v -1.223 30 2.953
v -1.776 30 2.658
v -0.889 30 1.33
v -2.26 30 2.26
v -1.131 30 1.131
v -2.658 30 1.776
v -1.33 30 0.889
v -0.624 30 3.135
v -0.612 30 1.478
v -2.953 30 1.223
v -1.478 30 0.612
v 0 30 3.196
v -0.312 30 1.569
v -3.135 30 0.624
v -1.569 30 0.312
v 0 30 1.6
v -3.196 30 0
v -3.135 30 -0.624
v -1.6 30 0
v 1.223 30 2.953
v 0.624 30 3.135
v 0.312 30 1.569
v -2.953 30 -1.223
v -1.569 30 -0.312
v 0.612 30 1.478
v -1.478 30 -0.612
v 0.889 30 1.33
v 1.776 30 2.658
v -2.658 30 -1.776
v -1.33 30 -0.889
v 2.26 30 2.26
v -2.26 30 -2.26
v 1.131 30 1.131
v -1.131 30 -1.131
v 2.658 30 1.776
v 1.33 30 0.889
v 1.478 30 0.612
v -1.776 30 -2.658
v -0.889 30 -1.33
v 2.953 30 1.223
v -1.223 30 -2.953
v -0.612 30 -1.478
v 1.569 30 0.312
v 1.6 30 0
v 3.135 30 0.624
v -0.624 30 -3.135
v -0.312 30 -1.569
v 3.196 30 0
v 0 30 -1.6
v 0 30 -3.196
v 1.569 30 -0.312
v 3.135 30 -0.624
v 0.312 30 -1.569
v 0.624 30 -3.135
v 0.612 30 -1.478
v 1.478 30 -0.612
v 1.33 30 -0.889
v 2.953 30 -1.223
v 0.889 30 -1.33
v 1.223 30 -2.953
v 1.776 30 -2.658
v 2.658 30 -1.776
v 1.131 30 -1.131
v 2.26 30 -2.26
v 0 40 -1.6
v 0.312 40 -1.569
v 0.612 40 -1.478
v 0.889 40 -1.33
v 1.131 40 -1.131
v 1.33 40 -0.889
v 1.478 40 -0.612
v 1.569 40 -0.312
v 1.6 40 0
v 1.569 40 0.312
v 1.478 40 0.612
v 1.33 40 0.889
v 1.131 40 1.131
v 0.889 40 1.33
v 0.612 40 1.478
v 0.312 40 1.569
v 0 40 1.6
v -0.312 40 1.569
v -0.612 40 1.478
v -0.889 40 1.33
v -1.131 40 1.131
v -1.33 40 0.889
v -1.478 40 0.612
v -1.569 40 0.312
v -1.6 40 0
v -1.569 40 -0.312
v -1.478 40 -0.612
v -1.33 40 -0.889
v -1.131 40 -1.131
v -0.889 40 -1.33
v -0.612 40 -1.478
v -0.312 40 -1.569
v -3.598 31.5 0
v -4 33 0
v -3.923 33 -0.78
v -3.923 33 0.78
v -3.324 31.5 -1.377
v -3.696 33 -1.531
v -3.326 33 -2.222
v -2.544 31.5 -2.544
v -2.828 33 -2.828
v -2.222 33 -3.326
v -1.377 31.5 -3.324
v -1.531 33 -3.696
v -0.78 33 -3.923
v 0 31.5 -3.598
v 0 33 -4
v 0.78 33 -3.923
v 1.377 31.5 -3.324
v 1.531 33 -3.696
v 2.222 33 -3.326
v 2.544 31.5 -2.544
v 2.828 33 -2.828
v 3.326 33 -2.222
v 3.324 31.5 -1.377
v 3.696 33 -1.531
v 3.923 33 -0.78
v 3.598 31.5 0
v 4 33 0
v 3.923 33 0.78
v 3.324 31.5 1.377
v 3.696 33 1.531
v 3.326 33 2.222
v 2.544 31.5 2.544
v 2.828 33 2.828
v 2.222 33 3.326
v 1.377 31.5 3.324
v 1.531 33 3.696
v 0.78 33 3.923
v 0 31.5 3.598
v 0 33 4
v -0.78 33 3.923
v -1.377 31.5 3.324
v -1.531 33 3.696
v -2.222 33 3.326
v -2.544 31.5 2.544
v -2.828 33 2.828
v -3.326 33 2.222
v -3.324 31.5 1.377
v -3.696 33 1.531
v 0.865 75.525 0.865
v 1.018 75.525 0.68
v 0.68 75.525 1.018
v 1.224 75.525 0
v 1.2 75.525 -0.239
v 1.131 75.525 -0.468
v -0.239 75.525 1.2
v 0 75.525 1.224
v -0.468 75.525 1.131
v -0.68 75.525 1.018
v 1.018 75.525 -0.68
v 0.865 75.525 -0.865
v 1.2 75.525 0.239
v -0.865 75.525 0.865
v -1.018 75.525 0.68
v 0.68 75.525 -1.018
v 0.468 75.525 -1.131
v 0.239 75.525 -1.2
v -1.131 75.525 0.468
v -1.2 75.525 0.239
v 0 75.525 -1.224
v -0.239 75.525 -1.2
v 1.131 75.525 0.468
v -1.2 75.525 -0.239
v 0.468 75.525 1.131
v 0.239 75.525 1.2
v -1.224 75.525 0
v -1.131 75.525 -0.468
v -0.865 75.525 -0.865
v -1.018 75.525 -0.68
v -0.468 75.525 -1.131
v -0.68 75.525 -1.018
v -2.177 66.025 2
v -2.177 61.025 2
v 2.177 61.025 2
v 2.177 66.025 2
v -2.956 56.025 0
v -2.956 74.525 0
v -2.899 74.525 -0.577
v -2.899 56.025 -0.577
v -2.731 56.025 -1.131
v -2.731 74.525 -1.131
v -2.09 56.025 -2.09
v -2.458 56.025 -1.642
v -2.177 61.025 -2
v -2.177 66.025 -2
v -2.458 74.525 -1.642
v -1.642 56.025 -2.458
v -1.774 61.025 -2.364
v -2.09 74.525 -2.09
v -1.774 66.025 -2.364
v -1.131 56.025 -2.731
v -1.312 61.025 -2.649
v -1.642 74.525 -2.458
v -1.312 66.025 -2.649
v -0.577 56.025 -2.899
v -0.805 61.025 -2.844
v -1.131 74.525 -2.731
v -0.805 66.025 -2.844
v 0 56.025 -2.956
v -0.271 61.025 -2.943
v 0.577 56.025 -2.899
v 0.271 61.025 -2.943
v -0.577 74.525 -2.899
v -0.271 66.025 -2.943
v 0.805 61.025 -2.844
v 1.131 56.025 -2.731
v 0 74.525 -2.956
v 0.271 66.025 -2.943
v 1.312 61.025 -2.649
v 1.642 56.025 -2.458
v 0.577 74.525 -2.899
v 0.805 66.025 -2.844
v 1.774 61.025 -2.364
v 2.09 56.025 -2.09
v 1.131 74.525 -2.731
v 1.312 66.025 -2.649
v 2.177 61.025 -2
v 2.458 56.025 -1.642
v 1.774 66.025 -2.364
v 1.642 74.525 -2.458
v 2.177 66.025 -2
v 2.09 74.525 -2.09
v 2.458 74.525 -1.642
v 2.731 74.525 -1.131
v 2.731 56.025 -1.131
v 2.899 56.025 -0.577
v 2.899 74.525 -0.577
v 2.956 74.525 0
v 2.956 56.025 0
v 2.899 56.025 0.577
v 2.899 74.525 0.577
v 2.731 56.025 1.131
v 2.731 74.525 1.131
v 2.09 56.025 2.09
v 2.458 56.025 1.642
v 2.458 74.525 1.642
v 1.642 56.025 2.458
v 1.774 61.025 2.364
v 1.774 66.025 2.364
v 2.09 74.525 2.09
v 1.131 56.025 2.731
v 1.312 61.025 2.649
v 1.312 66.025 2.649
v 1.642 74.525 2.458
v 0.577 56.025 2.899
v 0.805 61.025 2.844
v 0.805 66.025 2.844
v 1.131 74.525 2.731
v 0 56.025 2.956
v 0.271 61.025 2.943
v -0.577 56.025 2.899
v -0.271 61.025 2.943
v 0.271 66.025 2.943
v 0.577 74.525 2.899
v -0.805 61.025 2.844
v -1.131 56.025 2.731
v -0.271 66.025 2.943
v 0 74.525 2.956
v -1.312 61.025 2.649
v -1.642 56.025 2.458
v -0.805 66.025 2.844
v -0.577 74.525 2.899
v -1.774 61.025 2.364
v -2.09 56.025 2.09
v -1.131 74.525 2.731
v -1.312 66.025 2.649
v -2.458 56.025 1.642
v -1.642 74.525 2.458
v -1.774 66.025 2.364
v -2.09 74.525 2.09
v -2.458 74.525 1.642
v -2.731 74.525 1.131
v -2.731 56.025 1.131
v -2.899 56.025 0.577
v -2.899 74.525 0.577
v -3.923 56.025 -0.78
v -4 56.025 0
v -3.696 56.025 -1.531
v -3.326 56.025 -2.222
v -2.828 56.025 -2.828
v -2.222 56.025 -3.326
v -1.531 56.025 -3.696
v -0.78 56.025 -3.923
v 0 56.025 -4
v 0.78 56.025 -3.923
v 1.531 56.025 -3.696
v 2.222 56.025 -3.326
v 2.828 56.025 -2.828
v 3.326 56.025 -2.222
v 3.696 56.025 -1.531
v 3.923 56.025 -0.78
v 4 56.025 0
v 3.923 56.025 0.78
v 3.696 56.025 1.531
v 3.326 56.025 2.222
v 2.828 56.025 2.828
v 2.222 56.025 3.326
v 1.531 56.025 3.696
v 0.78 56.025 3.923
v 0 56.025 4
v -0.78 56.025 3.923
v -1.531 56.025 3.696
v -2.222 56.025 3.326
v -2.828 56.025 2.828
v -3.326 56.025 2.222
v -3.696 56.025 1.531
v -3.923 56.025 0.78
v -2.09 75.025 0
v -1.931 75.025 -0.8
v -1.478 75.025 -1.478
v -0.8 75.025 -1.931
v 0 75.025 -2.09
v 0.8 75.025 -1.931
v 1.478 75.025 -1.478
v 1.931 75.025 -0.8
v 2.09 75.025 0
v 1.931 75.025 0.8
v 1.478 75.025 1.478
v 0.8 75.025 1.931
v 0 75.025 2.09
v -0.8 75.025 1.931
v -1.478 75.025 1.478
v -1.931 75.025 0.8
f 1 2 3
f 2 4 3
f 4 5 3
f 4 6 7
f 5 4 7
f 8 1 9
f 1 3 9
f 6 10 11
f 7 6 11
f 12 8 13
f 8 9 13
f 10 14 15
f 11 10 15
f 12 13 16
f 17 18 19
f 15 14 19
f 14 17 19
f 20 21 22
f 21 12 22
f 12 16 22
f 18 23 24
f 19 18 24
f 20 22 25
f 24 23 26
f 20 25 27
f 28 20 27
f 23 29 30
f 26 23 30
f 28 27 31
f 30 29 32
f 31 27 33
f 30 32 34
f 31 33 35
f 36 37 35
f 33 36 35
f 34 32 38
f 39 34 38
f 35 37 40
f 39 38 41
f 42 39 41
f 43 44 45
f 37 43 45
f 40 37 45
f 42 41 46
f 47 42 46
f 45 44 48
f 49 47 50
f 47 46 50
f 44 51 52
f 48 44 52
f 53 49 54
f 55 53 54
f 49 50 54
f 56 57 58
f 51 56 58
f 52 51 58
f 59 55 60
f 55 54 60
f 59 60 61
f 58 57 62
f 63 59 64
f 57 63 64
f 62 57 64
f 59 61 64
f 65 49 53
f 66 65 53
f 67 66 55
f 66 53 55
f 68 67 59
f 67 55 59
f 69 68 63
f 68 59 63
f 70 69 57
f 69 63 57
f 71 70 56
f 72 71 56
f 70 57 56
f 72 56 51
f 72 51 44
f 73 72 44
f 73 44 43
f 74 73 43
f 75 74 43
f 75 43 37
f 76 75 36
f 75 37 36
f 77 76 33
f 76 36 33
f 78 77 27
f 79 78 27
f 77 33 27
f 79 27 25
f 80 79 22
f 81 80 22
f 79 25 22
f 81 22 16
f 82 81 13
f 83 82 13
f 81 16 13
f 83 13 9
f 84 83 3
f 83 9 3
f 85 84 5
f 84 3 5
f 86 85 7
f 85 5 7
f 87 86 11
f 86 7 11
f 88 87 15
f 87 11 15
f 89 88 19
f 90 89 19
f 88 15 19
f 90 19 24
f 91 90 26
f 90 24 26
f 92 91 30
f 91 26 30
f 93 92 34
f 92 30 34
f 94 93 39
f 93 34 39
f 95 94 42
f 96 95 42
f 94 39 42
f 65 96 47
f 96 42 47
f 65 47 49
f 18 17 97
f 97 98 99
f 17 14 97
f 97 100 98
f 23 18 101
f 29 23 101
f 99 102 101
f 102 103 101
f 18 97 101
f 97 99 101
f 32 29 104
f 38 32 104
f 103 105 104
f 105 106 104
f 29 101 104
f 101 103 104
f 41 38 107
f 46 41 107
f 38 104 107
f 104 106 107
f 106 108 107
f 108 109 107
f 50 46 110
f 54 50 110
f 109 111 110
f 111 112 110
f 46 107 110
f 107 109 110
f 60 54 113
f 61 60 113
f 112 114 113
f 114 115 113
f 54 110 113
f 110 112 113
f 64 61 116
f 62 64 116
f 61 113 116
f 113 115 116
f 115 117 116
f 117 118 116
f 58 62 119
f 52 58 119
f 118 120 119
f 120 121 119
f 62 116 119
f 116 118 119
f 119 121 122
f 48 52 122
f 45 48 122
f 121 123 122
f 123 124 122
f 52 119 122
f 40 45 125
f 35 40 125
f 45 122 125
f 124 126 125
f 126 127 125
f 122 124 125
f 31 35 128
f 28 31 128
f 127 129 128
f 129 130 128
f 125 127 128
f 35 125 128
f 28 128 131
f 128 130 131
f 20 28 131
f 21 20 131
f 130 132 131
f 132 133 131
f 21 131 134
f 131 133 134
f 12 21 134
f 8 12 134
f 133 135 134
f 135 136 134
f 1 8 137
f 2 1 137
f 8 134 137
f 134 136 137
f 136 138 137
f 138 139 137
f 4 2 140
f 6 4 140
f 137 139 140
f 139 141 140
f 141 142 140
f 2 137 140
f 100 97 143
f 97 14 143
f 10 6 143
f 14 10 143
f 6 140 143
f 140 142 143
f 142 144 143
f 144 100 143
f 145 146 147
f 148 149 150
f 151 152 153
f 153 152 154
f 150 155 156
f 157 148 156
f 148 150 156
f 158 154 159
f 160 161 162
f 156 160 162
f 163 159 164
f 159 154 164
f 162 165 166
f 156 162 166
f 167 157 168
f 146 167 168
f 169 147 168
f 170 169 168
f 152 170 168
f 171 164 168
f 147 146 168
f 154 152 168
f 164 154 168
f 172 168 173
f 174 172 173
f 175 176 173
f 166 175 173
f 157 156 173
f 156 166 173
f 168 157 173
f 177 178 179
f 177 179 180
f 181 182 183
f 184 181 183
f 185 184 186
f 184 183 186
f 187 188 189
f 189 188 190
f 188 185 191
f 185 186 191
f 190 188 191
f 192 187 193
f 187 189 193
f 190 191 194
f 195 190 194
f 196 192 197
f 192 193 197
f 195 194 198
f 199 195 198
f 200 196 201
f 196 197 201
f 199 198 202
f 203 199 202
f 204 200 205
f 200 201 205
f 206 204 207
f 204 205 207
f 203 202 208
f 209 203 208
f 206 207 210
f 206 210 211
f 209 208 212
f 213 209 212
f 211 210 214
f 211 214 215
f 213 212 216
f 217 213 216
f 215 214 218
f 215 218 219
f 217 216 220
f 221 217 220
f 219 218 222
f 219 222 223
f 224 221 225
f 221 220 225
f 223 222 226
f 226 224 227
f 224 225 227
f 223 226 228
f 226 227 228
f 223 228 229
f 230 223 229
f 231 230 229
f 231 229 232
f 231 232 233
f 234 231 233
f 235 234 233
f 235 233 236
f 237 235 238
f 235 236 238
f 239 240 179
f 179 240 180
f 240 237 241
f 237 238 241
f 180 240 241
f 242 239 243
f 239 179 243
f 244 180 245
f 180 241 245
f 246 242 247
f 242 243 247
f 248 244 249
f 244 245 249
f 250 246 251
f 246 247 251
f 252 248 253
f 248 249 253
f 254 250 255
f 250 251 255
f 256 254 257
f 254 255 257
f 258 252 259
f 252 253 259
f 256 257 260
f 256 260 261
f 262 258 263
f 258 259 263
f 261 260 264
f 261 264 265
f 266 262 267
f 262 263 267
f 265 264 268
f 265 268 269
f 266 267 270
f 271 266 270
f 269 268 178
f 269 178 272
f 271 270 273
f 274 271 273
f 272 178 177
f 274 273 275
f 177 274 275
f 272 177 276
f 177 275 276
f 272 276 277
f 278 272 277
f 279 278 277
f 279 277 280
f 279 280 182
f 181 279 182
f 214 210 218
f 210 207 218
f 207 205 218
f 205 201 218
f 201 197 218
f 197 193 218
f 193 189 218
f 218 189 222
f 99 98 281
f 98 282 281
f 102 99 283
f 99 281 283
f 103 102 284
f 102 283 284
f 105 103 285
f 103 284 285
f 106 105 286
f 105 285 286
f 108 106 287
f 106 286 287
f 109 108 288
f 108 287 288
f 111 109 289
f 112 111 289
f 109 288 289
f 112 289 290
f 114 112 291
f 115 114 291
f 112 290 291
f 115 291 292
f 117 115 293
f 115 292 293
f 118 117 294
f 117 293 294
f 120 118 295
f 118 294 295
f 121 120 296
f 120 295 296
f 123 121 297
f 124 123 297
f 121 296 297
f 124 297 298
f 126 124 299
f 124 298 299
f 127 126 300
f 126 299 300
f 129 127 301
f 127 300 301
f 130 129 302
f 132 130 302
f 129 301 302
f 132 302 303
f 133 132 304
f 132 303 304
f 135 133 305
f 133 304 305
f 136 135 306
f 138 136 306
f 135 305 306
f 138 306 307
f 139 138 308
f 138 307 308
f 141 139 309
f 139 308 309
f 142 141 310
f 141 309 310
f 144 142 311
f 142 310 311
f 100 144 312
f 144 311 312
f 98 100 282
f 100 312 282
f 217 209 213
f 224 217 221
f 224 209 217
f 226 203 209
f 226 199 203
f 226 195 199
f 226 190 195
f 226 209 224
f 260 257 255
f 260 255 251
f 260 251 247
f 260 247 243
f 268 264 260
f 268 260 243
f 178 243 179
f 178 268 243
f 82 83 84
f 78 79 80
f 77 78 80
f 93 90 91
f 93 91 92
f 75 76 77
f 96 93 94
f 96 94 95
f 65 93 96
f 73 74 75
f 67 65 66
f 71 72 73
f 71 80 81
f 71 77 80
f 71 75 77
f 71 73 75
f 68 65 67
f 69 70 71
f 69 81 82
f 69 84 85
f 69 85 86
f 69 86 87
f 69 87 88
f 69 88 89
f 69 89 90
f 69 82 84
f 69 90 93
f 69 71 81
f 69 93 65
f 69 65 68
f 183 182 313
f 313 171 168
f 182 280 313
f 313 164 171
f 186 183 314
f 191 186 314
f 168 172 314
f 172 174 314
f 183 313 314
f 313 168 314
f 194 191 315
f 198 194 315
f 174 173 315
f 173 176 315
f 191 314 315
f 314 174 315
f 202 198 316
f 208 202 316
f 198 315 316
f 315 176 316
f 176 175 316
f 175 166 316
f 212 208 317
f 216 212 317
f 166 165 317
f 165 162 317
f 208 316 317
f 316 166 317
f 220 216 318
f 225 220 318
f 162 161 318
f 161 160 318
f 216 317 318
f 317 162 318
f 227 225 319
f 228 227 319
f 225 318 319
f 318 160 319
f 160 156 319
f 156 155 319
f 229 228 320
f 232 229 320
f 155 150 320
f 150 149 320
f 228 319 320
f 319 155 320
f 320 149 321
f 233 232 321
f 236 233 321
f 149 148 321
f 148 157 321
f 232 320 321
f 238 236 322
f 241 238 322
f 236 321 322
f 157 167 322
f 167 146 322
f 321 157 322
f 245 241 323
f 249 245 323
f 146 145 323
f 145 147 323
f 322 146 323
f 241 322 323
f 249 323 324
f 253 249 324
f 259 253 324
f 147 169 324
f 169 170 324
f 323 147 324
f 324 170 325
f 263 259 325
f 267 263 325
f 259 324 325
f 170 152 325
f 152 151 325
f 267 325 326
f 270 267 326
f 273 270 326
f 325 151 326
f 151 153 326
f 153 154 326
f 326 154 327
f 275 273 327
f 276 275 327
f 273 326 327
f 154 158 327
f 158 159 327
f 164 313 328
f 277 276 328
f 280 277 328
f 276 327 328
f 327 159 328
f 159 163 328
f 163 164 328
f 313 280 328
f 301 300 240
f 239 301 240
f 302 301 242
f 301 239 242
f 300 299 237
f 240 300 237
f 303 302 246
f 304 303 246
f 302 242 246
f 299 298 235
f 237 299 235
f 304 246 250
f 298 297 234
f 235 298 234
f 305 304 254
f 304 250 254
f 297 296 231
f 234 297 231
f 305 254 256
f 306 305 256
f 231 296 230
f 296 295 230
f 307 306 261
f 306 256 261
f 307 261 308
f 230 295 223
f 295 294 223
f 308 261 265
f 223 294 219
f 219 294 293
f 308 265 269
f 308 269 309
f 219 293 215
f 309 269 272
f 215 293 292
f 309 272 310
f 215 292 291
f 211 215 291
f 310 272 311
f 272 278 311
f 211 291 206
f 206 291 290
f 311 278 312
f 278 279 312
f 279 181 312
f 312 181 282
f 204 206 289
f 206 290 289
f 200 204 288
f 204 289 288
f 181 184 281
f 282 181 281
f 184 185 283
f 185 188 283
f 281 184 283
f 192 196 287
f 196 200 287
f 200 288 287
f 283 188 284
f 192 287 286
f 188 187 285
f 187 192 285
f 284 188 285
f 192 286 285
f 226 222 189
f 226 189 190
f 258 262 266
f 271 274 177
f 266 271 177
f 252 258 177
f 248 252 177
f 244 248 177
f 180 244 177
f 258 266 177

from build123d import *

# Parameters (mm, degrees)
ESQUISSE4_R             = 1.6
ENL_V_MAT_EXTRU_1_DEPTH = 10
ESQUISSE7_W             = 2.232279801
ESQUISSE7_H             = 5
ENL_V_MAT_EXTRU_3_DEPTH = 5


with BuildPart() as part:
    # Esquisse1 → Révolution1 (revolve)
    with BuildSketch(Plane.XY):
        Polygon((0, 30), (-3.196152423, 30), (-4, 33), (-4, 56.025303512), (-2.955946463, 56.025303512), (-2.955946463, 74.525303512), (-1.223895655, 75.525303512), (0, 75.525303512), align=None)
    revolve(axis=Axis((0, 77.095183619, 0), (0, -1, 0)))

    # Esquisse4 → Enlèv. mat.-Extru.1 (cut)
    with BuildSketch(Plane.XZ.offset(-30)):
        Circle(ESQUISSE4_R)
    extrude(amount=-ENL_V_MAT_EXTRU_1_DEPTH, mode=Mode.SUBTRACT)

    # Esquisse7 → Enlèv. mat.-Extru.3 (cut, symmetric)
    with BuildSketch(Plane(origin=(0, 0, 0), x_dir=(0, 0, -1), z_dir=(1, 0, 0))):
        with Locations((-3.116139901, 63.525303512)):
            Rectangle(ESQUISSE7_W, ESQUISSE7_H)
        with Locations((3.116139901, 63.525303512)):
            Rectangle(ESQUISSE7_W, ESQUISSE7_H)
    extrude(amount=ENL_V_MAT_EXTRU_3_DEPTH, both=True, mode=Mode.SUBTRACT)


solid = part.part
